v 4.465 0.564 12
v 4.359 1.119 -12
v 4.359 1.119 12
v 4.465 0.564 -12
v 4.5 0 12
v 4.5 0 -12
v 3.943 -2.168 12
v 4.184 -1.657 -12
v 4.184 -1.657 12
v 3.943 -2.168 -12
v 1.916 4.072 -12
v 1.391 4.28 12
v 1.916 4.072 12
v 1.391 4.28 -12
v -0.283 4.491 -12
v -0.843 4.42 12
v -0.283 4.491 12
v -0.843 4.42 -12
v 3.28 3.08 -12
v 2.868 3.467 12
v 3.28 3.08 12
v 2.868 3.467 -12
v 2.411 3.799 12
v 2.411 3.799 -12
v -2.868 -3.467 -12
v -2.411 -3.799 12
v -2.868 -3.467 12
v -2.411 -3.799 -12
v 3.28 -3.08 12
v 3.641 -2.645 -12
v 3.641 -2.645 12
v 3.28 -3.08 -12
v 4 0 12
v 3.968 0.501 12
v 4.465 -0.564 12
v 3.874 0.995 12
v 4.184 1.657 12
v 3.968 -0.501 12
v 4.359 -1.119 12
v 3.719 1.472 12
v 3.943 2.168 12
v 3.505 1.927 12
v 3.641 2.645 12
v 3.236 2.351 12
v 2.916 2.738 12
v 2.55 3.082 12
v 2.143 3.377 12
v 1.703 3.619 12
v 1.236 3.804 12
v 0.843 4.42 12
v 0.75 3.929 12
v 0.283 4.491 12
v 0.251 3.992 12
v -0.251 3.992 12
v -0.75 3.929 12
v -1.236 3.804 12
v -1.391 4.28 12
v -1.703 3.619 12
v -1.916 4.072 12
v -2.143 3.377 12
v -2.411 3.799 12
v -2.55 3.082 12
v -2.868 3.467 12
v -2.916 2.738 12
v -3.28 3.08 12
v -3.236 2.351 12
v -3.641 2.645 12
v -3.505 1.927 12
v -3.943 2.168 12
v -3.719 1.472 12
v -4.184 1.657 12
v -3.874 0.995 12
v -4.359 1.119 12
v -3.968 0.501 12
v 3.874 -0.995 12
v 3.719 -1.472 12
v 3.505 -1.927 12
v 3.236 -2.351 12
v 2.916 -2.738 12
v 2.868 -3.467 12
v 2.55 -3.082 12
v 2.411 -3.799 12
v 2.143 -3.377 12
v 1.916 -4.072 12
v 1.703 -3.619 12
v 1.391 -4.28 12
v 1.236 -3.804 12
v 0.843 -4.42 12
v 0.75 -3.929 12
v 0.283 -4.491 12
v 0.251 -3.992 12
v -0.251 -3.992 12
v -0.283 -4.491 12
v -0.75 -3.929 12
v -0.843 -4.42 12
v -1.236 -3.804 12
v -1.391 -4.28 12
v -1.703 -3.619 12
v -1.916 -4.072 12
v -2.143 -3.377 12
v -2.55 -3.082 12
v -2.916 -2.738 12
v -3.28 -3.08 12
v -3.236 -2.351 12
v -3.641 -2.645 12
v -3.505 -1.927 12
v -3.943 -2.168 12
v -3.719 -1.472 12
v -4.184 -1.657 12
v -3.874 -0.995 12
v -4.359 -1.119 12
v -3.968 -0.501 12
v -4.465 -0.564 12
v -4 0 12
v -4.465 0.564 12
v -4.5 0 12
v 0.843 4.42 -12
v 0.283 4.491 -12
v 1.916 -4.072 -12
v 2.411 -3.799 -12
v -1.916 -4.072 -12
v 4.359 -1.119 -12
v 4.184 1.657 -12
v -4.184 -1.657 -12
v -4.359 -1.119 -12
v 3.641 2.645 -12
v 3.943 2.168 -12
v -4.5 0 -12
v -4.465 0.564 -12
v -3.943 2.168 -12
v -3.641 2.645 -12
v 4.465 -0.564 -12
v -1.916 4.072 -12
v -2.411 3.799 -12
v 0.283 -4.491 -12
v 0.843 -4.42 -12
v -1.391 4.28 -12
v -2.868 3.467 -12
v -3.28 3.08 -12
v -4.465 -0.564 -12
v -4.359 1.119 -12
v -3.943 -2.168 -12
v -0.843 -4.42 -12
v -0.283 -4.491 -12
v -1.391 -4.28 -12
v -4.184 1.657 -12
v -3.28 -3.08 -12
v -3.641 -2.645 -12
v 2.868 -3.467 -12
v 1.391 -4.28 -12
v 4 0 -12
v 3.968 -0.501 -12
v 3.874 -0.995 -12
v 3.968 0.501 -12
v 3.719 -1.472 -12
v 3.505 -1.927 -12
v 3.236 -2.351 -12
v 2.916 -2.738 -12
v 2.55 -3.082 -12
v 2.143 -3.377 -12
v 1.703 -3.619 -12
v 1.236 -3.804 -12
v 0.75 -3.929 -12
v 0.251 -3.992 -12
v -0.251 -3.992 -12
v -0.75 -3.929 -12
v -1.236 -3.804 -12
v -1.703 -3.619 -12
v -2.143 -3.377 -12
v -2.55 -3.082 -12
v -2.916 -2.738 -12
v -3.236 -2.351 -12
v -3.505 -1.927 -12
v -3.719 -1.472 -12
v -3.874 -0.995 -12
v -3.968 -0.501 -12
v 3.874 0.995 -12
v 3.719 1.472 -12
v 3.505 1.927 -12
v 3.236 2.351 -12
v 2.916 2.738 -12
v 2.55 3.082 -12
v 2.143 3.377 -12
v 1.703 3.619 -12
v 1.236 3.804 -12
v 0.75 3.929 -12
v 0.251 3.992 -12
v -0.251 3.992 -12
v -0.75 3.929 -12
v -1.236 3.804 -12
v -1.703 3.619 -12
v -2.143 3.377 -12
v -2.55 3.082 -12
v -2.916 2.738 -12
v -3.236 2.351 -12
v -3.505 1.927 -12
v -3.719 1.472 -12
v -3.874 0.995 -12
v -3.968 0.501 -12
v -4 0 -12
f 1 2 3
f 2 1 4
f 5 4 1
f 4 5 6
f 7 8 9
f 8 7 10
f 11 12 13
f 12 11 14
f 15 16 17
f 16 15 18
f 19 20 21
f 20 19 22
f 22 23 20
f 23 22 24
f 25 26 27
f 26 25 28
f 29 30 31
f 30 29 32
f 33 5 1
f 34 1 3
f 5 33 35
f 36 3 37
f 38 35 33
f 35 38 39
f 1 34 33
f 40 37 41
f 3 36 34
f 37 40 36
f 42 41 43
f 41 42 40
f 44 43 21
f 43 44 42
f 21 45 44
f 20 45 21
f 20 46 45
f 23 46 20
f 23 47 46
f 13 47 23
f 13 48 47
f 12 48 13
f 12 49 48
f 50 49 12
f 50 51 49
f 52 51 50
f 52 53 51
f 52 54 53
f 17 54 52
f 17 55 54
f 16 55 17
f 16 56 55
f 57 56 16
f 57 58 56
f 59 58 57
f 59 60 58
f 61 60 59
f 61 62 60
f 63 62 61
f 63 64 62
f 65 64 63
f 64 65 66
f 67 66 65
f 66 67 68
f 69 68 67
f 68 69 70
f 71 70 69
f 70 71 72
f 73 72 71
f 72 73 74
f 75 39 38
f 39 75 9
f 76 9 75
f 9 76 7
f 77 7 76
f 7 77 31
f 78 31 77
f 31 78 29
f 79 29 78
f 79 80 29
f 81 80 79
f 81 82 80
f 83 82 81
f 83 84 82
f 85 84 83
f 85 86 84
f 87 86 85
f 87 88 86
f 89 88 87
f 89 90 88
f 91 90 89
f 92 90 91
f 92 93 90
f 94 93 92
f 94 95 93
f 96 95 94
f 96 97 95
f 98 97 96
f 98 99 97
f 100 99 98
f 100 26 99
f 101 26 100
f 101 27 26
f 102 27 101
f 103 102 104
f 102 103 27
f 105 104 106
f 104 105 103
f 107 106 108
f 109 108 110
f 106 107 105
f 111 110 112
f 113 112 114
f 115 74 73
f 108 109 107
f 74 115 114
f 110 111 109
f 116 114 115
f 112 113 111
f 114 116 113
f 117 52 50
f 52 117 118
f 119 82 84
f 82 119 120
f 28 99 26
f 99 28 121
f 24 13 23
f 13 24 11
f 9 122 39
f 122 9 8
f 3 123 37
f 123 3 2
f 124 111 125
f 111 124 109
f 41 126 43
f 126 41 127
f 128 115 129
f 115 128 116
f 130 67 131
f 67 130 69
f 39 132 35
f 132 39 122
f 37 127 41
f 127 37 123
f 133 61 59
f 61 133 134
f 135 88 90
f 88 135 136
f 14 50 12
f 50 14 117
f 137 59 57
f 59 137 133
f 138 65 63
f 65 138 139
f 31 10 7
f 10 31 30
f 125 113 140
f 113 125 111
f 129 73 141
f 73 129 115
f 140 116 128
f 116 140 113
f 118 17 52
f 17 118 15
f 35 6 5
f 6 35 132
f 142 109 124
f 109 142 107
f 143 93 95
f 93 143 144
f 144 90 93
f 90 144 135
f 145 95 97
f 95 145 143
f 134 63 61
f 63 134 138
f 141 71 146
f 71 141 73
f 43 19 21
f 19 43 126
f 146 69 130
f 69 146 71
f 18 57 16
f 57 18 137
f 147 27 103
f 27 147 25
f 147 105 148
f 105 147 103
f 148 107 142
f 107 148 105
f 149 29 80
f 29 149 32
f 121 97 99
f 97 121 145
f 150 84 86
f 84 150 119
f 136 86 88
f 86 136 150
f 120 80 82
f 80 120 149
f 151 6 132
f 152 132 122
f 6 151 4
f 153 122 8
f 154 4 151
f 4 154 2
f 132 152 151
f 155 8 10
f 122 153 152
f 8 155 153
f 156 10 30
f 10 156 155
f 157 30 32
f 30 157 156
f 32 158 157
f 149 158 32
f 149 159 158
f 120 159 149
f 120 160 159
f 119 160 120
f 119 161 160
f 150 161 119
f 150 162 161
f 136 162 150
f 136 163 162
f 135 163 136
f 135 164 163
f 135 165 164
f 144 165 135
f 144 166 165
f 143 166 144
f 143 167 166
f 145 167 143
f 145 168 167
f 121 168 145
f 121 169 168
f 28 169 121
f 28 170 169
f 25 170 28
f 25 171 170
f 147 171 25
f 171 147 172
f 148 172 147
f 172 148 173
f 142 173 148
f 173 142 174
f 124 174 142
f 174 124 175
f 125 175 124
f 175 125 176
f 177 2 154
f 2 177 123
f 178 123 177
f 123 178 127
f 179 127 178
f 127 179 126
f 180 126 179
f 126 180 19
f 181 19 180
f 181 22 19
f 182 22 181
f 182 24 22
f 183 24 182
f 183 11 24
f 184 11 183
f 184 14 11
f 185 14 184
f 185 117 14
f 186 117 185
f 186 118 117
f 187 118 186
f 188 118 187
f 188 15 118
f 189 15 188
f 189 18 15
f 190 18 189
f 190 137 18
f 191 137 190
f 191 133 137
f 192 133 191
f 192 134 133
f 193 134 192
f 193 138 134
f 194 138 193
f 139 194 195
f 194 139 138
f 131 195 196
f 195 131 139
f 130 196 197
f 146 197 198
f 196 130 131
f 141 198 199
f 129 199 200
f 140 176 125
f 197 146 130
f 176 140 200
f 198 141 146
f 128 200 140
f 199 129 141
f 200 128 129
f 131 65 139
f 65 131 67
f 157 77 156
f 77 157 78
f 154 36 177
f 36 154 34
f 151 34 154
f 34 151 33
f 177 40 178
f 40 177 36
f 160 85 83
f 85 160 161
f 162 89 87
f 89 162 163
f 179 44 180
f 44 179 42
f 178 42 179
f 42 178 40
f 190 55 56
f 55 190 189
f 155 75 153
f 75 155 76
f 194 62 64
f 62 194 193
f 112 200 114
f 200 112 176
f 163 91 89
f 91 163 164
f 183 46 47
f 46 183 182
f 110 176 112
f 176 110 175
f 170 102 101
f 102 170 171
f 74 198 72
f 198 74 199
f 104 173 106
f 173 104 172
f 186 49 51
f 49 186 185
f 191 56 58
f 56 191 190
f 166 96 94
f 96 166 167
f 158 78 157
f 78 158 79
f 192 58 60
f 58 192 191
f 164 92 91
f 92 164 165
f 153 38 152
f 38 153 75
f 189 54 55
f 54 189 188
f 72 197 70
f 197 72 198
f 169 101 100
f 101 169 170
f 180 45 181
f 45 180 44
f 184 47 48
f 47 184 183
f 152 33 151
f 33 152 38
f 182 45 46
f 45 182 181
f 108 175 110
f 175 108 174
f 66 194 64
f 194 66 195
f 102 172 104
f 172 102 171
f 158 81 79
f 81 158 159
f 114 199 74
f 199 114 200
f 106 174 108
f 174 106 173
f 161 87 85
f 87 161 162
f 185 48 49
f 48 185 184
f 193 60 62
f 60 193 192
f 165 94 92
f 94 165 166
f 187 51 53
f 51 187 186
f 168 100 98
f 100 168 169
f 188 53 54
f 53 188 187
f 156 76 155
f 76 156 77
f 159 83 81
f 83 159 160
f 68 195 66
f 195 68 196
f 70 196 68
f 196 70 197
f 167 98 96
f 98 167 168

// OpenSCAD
$fn = 50;


difference() {
	union() {
		translate(v = [0, 0, -12.0000000000]) {
			cylinder(h = 24, r = 4.5000000000);
		}
	}
	union() {
		translate(v = [0, 0, -100.0000000000]) {
			cylinder(h = 200, r = 4.0000000000);
		}
	}
}
